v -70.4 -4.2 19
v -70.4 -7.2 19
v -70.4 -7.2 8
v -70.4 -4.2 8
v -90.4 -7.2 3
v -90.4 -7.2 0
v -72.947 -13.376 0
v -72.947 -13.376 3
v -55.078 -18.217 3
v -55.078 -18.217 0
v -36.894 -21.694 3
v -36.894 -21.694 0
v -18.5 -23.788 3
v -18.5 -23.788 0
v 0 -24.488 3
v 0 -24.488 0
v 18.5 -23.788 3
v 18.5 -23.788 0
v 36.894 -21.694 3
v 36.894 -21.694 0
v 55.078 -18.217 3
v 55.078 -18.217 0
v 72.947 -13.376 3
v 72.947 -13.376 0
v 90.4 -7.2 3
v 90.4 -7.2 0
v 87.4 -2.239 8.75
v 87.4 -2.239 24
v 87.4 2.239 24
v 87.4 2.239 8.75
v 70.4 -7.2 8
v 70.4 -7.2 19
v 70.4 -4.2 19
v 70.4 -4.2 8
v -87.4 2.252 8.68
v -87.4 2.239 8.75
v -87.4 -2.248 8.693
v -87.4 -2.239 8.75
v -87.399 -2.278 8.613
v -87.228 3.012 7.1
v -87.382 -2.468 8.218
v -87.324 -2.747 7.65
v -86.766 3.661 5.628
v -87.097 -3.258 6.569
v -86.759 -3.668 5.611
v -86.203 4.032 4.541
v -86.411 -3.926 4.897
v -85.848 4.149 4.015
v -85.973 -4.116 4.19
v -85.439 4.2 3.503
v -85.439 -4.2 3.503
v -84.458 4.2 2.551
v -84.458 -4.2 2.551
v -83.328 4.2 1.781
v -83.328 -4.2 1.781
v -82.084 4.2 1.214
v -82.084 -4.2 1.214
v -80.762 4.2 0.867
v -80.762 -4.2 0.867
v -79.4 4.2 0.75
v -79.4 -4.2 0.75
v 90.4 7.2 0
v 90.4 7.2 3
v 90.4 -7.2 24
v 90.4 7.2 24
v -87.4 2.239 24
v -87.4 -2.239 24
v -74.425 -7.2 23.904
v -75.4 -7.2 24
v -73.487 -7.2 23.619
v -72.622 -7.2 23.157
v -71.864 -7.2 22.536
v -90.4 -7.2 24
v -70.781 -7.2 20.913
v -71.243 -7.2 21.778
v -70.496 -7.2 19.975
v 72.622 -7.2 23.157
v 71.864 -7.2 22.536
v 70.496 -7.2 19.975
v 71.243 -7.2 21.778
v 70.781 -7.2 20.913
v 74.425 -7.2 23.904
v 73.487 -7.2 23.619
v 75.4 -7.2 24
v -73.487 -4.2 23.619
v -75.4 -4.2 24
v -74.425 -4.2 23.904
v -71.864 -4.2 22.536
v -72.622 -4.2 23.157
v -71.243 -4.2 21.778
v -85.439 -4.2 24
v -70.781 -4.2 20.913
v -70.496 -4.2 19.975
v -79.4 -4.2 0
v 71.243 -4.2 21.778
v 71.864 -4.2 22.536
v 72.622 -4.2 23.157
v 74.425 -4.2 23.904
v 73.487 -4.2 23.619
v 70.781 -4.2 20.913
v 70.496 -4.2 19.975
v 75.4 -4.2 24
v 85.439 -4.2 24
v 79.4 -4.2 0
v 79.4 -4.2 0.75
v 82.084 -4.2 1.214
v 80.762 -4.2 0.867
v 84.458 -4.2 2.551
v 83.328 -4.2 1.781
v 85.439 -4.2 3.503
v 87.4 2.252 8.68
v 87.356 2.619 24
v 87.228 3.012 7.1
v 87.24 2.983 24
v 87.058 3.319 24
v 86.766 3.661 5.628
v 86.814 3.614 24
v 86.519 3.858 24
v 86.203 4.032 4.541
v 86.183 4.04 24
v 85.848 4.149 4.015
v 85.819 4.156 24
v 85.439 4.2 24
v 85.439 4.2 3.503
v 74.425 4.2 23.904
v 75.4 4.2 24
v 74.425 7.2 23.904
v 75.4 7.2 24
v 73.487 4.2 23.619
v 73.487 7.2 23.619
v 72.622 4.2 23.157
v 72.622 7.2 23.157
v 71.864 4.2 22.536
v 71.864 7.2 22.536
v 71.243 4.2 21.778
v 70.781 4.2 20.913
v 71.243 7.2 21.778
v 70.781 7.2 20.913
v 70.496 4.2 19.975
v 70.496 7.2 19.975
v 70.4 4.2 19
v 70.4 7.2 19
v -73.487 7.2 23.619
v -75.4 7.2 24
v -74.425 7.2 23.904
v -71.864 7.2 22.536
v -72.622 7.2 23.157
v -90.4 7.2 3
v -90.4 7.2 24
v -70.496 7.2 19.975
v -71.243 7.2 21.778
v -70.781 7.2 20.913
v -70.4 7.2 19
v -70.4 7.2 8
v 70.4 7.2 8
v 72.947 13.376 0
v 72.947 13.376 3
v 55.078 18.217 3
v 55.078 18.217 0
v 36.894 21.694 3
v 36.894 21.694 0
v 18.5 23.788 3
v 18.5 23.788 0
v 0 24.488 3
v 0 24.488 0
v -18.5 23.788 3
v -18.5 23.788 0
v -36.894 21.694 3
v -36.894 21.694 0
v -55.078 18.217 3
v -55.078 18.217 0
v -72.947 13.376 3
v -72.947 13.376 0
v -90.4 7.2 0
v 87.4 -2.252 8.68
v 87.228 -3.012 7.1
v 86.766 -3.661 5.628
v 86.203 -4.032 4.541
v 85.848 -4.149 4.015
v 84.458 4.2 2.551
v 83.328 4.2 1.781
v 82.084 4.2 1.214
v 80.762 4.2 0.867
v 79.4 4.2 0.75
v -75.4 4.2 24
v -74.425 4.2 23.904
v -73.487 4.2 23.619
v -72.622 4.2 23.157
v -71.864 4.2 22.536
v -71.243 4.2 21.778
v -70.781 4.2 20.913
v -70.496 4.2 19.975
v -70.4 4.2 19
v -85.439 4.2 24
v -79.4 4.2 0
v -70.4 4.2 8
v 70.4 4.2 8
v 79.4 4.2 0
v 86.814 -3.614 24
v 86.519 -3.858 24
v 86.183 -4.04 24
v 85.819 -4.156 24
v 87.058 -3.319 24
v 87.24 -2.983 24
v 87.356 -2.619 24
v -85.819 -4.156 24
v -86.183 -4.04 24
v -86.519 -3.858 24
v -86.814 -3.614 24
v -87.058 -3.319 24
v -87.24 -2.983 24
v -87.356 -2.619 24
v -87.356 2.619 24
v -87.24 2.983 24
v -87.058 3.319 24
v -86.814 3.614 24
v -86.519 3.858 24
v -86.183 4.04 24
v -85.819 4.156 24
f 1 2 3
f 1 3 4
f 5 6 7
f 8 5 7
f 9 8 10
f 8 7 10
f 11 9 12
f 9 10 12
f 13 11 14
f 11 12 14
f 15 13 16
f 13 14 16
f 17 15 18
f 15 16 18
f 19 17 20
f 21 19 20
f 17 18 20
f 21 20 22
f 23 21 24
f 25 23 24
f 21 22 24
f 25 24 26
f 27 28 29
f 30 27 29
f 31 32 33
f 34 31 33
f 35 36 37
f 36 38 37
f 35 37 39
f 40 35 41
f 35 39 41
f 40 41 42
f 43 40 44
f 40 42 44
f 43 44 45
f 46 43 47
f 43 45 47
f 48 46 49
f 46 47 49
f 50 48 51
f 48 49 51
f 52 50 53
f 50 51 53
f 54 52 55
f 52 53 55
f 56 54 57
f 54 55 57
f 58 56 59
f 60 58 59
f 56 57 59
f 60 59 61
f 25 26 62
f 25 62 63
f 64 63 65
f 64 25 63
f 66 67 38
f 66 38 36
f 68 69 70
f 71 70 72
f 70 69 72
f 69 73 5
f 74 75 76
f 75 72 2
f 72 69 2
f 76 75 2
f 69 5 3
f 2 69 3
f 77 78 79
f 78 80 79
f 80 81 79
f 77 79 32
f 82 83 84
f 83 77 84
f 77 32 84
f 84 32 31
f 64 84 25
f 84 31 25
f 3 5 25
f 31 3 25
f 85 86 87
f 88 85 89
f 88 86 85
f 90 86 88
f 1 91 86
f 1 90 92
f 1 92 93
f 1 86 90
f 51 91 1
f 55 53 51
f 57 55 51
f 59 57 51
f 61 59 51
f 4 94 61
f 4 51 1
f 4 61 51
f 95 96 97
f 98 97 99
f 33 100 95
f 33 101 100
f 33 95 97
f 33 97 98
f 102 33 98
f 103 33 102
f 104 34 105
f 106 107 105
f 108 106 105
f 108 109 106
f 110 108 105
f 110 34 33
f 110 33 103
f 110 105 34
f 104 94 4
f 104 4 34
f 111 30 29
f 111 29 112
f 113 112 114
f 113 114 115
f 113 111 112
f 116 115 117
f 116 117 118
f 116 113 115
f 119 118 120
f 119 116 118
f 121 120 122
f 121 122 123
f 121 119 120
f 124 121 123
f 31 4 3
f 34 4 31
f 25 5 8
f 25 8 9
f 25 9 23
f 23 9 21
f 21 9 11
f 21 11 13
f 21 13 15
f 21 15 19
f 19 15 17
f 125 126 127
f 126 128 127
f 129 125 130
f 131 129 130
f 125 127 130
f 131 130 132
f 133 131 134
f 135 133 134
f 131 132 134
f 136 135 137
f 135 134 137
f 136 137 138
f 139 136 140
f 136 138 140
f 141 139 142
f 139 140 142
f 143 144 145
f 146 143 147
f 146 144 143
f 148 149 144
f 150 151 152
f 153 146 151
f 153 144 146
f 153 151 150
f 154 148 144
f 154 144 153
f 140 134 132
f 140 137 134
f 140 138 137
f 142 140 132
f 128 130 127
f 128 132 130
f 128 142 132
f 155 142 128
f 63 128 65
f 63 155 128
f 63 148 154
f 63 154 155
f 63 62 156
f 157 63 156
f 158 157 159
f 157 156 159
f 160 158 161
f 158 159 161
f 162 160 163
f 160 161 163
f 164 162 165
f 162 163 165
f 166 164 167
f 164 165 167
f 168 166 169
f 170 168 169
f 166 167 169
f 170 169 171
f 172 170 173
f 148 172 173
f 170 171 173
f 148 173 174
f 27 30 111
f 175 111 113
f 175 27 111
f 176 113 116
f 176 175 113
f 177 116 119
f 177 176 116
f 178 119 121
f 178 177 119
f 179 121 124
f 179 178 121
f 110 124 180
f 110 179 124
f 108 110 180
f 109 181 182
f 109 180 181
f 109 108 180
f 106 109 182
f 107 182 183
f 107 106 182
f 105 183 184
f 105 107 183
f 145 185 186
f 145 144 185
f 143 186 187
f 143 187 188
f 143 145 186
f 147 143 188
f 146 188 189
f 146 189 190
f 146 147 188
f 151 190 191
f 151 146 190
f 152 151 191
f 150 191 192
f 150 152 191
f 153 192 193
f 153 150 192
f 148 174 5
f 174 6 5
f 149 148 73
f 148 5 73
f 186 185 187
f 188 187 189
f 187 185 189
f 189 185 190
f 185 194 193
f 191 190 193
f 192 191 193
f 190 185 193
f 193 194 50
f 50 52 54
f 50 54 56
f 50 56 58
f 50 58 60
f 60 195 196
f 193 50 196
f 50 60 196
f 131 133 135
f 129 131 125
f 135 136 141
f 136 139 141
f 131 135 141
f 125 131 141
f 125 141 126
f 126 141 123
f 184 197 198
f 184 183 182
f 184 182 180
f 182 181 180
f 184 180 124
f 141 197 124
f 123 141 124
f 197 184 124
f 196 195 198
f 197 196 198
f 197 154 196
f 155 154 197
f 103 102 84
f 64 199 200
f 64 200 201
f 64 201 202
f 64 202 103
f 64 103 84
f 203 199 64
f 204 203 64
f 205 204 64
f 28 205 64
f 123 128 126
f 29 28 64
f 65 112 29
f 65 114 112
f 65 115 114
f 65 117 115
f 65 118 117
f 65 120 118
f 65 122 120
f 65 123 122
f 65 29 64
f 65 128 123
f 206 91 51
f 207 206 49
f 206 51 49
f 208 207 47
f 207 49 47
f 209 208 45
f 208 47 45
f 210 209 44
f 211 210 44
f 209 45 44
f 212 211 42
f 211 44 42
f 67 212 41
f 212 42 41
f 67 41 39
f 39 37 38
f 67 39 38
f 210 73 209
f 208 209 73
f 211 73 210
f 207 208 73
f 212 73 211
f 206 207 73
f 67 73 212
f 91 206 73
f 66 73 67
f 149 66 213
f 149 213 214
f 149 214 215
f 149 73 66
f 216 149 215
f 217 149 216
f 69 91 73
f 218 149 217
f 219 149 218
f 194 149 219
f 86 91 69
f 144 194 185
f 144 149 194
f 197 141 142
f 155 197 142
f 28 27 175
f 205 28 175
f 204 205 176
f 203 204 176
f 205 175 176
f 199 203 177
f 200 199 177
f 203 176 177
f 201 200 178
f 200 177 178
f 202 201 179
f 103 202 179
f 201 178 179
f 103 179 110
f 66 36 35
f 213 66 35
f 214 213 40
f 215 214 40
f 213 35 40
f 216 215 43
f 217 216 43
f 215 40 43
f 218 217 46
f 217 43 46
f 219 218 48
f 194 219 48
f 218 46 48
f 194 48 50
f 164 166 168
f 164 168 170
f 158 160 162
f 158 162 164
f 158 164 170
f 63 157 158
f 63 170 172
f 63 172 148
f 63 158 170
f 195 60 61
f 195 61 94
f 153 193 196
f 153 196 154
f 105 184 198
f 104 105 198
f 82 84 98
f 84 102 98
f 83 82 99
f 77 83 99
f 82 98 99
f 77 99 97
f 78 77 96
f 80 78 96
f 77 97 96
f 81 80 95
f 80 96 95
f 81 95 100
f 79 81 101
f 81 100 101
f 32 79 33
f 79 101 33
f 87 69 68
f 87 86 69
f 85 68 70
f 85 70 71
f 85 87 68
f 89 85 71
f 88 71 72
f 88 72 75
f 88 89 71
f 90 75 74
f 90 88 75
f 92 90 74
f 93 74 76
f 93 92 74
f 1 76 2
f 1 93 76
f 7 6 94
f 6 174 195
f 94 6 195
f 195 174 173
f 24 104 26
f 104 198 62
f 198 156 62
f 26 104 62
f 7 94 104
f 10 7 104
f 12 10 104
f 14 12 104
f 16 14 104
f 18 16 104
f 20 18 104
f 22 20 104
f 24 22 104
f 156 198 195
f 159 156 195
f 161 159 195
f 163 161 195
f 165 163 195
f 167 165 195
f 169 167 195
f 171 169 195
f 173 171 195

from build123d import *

# Parameters (mm, degrees)
F1_W        = 180.8
F1_H        = 14.4
F1_W_2      = 174.8
F1_H_2      = 8.4
F2_DEPTH    = 24
F3_T1_DEPTH = 24
F5_DEPTH    = 4.35
F6_W        = 140.8
F6_H        = 14.4
F7_DEPTH    = 16
F8_R        = 5
F10_DEPTH   = 3


# Not quite as in the source:
# - a fillet or chamfer that OpenCascade refuses, or shapes differently, is made with other operations: its cross-section is extruded or revolved along the edge and cut away or added
# - a pattern or mirror of a feature is missing from the dataset's text; its kind, count and spacing are read off the source's solid


with BuildPart() as f2:
    # F1 (on Top) → F2 (new body)
    with BuildSketch(Plane.XY):
        Rectangle(F1_W, F1_H)
        Rectangle(F1_W_2, F1_H_2, mode=Mode.SUBTRACT)
    extrude(amount=F2_DEPTH)

    # F3: fillet of radius 2 on 4 edges, made by hand

    # F3_s2 → F3_t1 (join)
    with BuildSketch(Plane.XY):
        with BuildLine():
            ThreePointArc((87.4004, -2.1990343146), (86.8142135624, -3.6142135624), (85.3990343146, -4.2004))
            Line((85.3990343146, -4.2004), (85.3990343146, -4.4005365685))
            ThreePointArc((85.3990343146, -4.4005365685), (86.3995171573, -4.4001365685), (87.4, -4.4001365685))
            Line((87.4, -4.4001365685), (87.6001365685, -4.2))
            ThreePointArc((87.6001365685, -4.2), (87.6001365685, -3.1995171573), (87.6005365685, -2.1990343146))
            Line((87.6005365685, -2.1990343146), (87.4004, -2.1990343146))
        make_face()
        with BuildLine():
            ThreePointArc((87.4004, 2.1990343146), (86.8142135624, 3.6142135624), (85.3990343146, 4.2004))
            Line((85.3990343146, 4.2004), (85.3990343146, 4.4005365685))
            ThreePointArc((85.3990343146, 4.4005365685), (86.3995171573, 4.4001365685), (87.4, 4.4001365685))
            Line((87.4, 4.4001365685), (87.6001365685, 4.2))
            ThreePointArc((87.6001365685, 4.2), (87.6001365685, 3.1995171573), (87.6005365685, 2.1990343146))
            Line((87.6005365685, 2.1990343146), (87.4004, 2.1990343146))
        make_face()
        with BuildLine():
            ThreePointArc((-85.3990343146, -4.2004), (-86.8142135624, -3.6142135624), (-87.4004, -2.1990343146))
            Line((-87.4004, -2.1990343146), (-87.6005365685, -2.1990343146))
            ThreePointArc((-87.6005365685, -2.1990343146), (-87.6001365685, -3.1995171573), (-87.6001365685, -4.2))
            Line((-87.6001365685, -4.2), (-87.4, -4.4001365685))
            ThreePointArc((-87.4, -4.4001365685), (-86.3995171573, -4.4001365685), (-85.3990343146, -4.4005365685))
            Line((-85.3990343146, -4.4005365685), (-85.3990343146, -4.2004))
        make_face()
        with BuildLine():
            ThreePointArc((-87.4004, 2.1990343146), (-86.8142135624, 3.6142135624), (-85.3990343146, 4.2004))
            Line((-85.3990343146, 4.2004), (-85.3990343146, 4.4005365685))
            ThreePointArc((-85.3990343146, 4.4005365685), (-86.3995171573, 4.4001365685), (-87.4, 4.4001365685))
            Line((-87.4, 4.4001365685), (-87.6001365685, 4.2))
            ThreePointArc((-87.6001365685, 4.2), (-87.6001365685, 3.1995171573), (-87.6005365685, 2.1990343146))
            Line((-87.6005365685, 2.1990343146), (-87.4004, 2.1990343146))
        make_face()
    extrude(amount=F3_T1_DEPTH)

    # F4 (on Front) → F5 (join, symmetric)
    with BuildSketch(Plane.XZ):
        with BuildLine():
            ThreePointArc((87.4, 8.75), (85.0568542495, 3.0931457505), (79.4, 0.75))
            Line((79.4, 0.75), (79.4, 0))
            Line((79.4, 0), (90.4, 0))
            Line((90.4, 0), (90.4, 8.75))
            Line((90.4, 8.75), (87.4, 8.75))
        make_face()
    f5 = extrude(amount=F5_DEPTH, both=True)

    # F5_copies: F5 across plane
    add(f5.mirror(Plane(origin=(0, 0, 0), x_dir=(0, 0, -1), z_dir=(-1, 0, 0))))

    # F6 (on face) → F7 (cut)
    with BuildSketch(Plane.XY.offset(24)):
        Rectangle(F6_W, F6_H)
    extrude(amount=-F7_DEPTH, mode=Mode.SUBTRACT)

    # F8
    f8_edges = [f2.edges().sort_by_distance(p)[0] for p in [
        (-70.4, 5.7, 24),
        (-70.4, -5.7, 24),
        (70.4, 5.7, 24),
        (70.4, -5.7, 24),
    ]]
    fillet(f8_edges, radius=F8_R)

    # F9 (on Top) → F10 (join)
    with BuildSketch(Plane.XY):
        with BuildLine():
            Line((90.4, -7.2), (-90.4, -7.2))
            ThreePointArc((-90.4, -7.2), (0, -24.4878132379), (90.4, -7.2))
        make_face()
        with BuildLine():
            Line((-90.4, 7.2), (90.4, 7.2))
            ThreePointArc((90.4, 7.2), (0, 24.4878132379), (-90.4, 7.2))
        make_face()
    extrude(amount=F10_DEPTH)


solid = f2.part
